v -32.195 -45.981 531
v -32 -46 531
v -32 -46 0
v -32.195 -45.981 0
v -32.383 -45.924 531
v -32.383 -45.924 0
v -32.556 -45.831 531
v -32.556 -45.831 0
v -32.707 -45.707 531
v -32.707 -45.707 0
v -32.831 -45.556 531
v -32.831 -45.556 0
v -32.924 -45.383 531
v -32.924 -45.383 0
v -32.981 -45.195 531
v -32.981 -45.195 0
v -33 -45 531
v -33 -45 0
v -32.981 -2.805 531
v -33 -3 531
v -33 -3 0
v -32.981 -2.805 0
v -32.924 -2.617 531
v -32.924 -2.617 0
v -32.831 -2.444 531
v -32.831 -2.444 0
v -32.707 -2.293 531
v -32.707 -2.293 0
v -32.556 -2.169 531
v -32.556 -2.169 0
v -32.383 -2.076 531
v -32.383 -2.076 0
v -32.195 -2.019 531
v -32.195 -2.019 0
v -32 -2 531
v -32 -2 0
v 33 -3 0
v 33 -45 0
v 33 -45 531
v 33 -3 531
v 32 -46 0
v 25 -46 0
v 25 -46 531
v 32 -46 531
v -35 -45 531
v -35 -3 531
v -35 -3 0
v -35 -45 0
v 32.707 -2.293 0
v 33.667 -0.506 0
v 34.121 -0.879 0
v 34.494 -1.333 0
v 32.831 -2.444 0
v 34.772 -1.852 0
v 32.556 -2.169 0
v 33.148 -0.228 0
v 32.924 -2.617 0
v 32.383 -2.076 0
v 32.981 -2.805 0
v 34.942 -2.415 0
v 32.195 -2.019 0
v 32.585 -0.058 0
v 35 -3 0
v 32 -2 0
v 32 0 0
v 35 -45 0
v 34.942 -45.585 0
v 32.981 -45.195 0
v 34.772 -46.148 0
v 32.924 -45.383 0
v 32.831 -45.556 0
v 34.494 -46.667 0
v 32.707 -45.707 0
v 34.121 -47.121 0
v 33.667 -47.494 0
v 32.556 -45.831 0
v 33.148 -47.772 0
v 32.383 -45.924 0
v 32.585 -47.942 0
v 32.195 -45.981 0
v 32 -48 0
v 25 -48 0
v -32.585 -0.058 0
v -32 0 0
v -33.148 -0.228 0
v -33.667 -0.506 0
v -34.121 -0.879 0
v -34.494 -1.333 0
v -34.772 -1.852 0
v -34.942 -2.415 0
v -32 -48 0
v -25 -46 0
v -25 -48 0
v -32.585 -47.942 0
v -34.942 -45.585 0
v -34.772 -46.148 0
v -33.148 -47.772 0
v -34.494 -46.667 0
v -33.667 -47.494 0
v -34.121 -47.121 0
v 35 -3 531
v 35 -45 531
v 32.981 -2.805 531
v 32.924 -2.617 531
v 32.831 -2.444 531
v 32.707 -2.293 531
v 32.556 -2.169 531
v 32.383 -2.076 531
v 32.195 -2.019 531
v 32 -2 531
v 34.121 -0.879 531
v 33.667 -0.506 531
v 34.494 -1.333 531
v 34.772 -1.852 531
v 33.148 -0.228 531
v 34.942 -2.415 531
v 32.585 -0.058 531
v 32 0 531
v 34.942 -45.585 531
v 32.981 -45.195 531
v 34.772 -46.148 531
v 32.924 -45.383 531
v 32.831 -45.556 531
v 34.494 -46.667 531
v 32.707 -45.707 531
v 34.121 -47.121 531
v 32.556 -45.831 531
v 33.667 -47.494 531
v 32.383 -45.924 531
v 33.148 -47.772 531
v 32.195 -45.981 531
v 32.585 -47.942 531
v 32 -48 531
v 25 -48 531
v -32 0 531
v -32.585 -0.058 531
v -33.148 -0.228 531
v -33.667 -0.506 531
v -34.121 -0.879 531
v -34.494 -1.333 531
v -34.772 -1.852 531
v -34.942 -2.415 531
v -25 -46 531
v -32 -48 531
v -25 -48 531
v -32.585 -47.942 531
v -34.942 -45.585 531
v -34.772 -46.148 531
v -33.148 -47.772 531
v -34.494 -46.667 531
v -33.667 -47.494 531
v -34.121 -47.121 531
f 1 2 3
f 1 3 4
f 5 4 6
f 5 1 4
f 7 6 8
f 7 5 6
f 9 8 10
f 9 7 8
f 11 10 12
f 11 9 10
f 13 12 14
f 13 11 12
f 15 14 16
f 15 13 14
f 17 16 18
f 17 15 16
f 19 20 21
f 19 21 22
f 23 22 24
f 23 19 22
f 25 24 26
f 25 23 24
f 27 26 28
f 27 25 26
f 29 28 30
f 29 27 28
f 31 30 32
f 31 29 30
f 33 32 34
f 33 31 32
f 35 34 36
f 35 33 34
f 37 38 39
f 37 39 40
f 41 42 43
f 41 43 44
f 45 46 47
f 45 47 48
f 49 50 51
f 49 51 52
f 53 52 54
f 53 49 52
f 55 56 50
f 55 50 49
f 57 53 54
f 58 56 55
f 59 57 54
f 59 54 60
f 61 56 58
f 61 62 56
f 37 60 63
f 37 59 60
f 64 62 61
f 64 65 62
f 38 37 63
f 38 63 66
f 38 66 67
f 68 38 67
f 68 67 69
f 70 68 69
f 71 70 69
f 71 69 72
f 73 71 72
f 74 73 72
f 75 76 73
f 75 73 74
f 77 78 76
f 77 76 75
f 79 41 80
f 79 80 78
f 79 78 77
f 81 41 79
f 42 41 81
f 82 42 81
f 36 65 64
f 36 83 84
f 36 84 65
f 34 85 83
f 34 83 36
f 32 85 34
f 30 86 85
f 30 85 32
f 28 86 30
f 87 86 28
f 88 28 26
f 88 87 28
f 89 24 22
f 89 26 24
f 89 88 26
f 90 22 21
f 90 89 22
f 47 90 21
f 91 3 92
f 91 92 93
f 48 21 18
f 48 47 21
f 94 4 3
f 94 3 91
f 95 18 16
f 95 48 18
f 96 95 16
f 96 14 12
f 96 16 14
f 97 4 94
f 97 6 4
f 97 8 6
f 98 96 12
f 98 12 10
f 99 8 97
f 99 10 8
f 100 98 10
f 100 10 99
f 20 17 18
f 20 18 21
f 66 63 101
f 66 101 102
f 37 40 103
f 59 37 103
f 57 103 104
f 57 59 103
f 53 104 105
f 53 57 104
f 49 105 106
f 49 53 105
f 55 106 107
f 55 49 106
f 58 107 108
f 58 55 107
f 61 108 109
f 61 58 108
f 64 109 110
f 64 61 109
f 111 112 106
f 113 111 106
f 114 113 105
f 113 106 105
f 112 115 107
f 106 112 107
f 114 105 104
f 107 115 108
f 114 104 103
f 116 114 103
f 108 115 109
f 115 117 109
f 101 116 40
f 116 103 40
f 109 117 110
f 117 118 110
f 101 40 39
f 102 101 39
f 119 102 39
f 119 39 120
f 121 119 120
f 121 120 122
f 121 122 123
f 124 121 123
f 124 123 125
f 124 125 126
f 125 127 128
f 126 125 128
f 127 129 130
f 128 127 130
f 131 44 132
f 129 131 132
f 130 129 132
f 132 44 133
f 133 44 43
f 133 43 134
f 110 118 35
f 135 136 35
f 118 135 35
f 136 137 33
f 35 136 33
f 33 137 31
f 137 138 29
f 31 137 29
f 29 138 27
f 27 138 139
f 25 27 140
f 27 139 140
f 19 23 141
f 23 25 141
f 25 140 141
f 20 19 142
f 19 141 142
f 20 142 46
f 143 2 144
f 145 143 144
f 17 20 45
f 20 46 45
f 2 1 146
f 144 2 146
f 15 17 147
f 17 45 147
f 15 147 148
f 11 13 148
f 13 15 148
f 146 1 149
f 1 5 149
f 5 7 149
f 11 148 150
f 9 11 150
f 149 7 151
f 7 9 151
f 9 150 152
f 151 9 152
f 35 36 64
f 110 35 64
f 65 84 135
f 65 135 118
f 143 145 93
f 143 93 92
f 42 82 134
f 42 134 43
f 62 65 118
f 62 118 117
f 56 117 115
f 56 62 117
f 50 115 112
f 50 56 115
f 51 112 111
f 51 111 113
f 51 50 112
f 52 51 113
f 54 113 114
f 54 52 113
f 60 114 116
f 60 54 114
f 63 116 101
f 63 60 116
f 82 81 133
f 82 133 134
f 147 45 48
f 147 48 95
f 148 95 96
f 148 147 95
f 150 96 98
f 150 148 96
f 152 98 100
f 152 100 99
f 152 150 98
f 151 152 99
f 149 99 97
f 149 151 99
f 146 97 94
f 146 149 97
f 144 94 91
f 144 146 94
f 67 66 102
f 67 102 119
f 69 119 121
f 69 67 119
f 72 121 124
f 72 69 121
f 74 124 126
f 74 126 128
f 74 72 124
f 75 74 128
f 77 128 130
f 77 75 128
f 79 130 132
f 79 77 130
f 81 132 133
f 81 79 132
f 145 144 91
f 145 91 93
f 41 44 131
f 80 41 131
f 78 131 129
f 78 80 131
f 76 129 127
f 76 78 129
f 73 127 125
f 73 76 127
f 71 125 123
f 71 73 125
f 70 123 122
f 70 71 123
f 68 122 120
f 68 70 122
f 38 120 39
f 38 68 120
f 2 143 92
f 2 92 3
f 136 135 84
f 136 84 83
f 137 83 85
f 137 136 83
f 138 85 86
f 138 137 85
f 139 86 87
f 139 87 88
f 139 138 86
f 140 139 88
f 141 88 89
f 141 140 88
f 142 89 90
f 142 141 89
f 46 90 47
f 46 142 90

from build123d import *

# Parameters (mm, degrees)
BASEFLANGE_W                   = 70
BASEFLANGE_H                   = 531
BASE_FLANGE1_DEPTH             = 2
EDGE_FLANGE1_STRIP_W           = 10
EDGE_FLANGE1_STRIP_H           = 2
EDGE_FLANGE1_STRIP_CUT_DEPTH   = 531
EDGE_FLANGE1_STRIP_2_W         = 10
EDGE_FLANGE1_STRIP_2_H         = 2
EDGE_FLANGE1_STRIP_CUT_2_DEPTH = 531
EDGE_FLANGE1_DEPTH             = 531
EDGE_FLANGE1_BEND_DEPTH        = 531
EDGE_FLANGE2_STRIP_W           = 10
EDGE_FLANGE2_STRIP_H           = 2
EDGE_FLANGE2_STRIP_CUT_DEPTH   = 531
EDGE_FLANGE2_STRIP_2_W         = 10
EDGE_FLANGE2_STRIP_2_H         = 2
EDGE_FLANGE2_STRIP_CUT_2_DEPTH = 531
EDGE_FLANGE2_DEPTH             = 531
EDGE_FLANGE2_BEND_DEPTH        = 531


# Sheet-metal steps are written as plain solids
with BuildPart() as part:
    # BaseFlange → Base-Flange1 (new body)
    with BuildSketch(Plane(origin=(0, 0, 0), x_dir=(1, 0, 0), z_dir=(0, 1, 0))):
        with Locations((0, -265.5)):
            Rectangle(BASEFLANGE_W, BASEFLANGE_H)
    extrude(amount=-BASE_FLANGE1_DEPTH)

    # Edge-Flange1 strip (across the edge) → Edge-Flange1 strip cut (cut)
    with BuildSketch(Plane(origin=(-35, -2, 531), x_dir=(1, 0, 0), z_dir=(0, 0, -1))):
        with Locations((-2, -1)):
            Rectangle(EDGE_FLANGE1_STRIP_W, EDGE_FLANGE1_STRIP_H)
    extrude(amount=EDGE_FLANGE1_STRIP_CUT_DEPTH, mode=Mode.SUBTRACT)

    # Edge-Flange1 strip 2 (across the edge) → Edge-Flange1 strip cut 2 (cut)
    with BuildSketch(Plane(origin=(35, -2, 0), x_dir=(-1, 0, 0), z_dir=(0, 0, 1))):
        with Locations((-2, -1)):
            Rectangle(EDGE_FLANGE1_STRIP_2_W, EDGE_FLANGE1_STRIP_2_H)
    extrude(amount=EDGE_FLANGE1_STRIP_CUT_2_DEPTH, mode=Mode.SUBTRACT)

    # Edge-Flange1 section (across the edge) → Edge-Flange1 (add)
    with BuildSketch(Plane(origin=(-35, -2, 531), x_dir=(1, 0, 0), z_dir=(0, 0, -1))):
        with BuildLine():
            Line((0, 1), (0, 46))
            Line((0, 46), (2, 46))
            Line((2, 46), (2, 1))
            ThreePointArc((2, 1), (2.292893219, 0.292893219), (3, 0))
            Line((3, 0), (3, -2))
            ThreePointArc((3, -2), (0.878679656, -1.121320344), (0, 1))
        make_face()
    extrude(amount=EDGE_FLANGE1_DEPTH)

    # Edge-Flange1 section 2 (across the edge) → Edge-Flange1 bend (add)
    with BuildSketch(Plane(origin=(35, -2, 0), x_dir=(-1, 0, 0), z_dir=(0, 0, 1))):
        with BuildLine():
            Line((0, 1), (0, 46))
            Line((0, 46), (2, 46))
            Line((2, 46), (2, 1))
            ThreePointArc((2, 1), (2.292893219, 0.292893219), (3, 0))
            Line((3, 0), (3, -2))
            ThreePointArc((3, -2), (0.878679656, -1.121320344), (0, 1))
        make_face()
    extrude(amount=EDGE_FLANGE1_BEND_DEPTH)

    # Edge-Flange2 strip (across the edge) → Edge-Flange2 strip cut (cut)
    with BuildSketch(Plane(origin=(-33, -48, 531), x_dir=(0, 1, 0), z_dir=(0, 0, -1))):
        with Locations((-2, -1)):
            Rectangle(EDGE_FLANGE2_STRIP_W, EDGE_FLANGE2_STRIP_H)
    extrude(amount=EDGE_FLANGE2_STRIP_CUT_DEPTH, mode=Mode.SUBTRACT)

    # Edge-Flange2 strip 2 (across the edge) → Edge-Flange2 strip cut 2 (cut)
    with BuildSketch(Plane(origin=(33, -48, 0), x_dir=(0, 1, 0), z_dir=(0, 0, 1))):
        with Locations((-2, -1)):
            Rectangle(EDGE_FLANGE2_STRIP_2_W, EDGE_FLANGE2_STRIP_2_H)
    extrude(amount=EDGE_FLANGE2_STRIP_CUT_2_DEPTH, mode=Mode.SUBTRACT)

    # Edge-Flange2 section (across the edge) → Edge-Flange2 (add)
    with BuildSketch(Plane(origin=(-33, -48, 531), x_dir=(0, 1, 0), z_dir=(0, 0, -1))):
        with BuildLine():
            Line((0, 1), (0, 8))
            Line((0, 8), (2, 8))
            Line((2, 8), (2, 1))
            ThreePointArc((2, 1), (2.292893219, 0.292893219), (3, 0))
            Line((3, 0), (3, -2))
            ThreePointArc((3, -2), (0.878679656, -1.121320344), (0, 1))
        make_face()
    extrude(amount=EDGE_FLANGE2_DEPTH)

    # Edge-Flange2 section 2 (across the edge) → Edge-Flange2 bend (add)
    with BuildSketch(Plane(origin=(33, -48, 0), x_dir=(0, 1, 0), z_dir=(0, 0, 1))):
        with BuildLine():
            Line((0, 1), (0, 8))
            Line((0, 8), (2, 8))
            Line((2, 8), (2, 1))
            ThreePointArc((2, 1), (2.292893219, 0.292893219), (3, 0))
            Line((3, 0), (3, -2))
            ThreePointArc((3, -2), (0.878679656, -1.121320344), (0, 1))
        make_face()
    extrude(amount=EDGE_FLANGE2_BEND_DEPTH)


solid = part.part
